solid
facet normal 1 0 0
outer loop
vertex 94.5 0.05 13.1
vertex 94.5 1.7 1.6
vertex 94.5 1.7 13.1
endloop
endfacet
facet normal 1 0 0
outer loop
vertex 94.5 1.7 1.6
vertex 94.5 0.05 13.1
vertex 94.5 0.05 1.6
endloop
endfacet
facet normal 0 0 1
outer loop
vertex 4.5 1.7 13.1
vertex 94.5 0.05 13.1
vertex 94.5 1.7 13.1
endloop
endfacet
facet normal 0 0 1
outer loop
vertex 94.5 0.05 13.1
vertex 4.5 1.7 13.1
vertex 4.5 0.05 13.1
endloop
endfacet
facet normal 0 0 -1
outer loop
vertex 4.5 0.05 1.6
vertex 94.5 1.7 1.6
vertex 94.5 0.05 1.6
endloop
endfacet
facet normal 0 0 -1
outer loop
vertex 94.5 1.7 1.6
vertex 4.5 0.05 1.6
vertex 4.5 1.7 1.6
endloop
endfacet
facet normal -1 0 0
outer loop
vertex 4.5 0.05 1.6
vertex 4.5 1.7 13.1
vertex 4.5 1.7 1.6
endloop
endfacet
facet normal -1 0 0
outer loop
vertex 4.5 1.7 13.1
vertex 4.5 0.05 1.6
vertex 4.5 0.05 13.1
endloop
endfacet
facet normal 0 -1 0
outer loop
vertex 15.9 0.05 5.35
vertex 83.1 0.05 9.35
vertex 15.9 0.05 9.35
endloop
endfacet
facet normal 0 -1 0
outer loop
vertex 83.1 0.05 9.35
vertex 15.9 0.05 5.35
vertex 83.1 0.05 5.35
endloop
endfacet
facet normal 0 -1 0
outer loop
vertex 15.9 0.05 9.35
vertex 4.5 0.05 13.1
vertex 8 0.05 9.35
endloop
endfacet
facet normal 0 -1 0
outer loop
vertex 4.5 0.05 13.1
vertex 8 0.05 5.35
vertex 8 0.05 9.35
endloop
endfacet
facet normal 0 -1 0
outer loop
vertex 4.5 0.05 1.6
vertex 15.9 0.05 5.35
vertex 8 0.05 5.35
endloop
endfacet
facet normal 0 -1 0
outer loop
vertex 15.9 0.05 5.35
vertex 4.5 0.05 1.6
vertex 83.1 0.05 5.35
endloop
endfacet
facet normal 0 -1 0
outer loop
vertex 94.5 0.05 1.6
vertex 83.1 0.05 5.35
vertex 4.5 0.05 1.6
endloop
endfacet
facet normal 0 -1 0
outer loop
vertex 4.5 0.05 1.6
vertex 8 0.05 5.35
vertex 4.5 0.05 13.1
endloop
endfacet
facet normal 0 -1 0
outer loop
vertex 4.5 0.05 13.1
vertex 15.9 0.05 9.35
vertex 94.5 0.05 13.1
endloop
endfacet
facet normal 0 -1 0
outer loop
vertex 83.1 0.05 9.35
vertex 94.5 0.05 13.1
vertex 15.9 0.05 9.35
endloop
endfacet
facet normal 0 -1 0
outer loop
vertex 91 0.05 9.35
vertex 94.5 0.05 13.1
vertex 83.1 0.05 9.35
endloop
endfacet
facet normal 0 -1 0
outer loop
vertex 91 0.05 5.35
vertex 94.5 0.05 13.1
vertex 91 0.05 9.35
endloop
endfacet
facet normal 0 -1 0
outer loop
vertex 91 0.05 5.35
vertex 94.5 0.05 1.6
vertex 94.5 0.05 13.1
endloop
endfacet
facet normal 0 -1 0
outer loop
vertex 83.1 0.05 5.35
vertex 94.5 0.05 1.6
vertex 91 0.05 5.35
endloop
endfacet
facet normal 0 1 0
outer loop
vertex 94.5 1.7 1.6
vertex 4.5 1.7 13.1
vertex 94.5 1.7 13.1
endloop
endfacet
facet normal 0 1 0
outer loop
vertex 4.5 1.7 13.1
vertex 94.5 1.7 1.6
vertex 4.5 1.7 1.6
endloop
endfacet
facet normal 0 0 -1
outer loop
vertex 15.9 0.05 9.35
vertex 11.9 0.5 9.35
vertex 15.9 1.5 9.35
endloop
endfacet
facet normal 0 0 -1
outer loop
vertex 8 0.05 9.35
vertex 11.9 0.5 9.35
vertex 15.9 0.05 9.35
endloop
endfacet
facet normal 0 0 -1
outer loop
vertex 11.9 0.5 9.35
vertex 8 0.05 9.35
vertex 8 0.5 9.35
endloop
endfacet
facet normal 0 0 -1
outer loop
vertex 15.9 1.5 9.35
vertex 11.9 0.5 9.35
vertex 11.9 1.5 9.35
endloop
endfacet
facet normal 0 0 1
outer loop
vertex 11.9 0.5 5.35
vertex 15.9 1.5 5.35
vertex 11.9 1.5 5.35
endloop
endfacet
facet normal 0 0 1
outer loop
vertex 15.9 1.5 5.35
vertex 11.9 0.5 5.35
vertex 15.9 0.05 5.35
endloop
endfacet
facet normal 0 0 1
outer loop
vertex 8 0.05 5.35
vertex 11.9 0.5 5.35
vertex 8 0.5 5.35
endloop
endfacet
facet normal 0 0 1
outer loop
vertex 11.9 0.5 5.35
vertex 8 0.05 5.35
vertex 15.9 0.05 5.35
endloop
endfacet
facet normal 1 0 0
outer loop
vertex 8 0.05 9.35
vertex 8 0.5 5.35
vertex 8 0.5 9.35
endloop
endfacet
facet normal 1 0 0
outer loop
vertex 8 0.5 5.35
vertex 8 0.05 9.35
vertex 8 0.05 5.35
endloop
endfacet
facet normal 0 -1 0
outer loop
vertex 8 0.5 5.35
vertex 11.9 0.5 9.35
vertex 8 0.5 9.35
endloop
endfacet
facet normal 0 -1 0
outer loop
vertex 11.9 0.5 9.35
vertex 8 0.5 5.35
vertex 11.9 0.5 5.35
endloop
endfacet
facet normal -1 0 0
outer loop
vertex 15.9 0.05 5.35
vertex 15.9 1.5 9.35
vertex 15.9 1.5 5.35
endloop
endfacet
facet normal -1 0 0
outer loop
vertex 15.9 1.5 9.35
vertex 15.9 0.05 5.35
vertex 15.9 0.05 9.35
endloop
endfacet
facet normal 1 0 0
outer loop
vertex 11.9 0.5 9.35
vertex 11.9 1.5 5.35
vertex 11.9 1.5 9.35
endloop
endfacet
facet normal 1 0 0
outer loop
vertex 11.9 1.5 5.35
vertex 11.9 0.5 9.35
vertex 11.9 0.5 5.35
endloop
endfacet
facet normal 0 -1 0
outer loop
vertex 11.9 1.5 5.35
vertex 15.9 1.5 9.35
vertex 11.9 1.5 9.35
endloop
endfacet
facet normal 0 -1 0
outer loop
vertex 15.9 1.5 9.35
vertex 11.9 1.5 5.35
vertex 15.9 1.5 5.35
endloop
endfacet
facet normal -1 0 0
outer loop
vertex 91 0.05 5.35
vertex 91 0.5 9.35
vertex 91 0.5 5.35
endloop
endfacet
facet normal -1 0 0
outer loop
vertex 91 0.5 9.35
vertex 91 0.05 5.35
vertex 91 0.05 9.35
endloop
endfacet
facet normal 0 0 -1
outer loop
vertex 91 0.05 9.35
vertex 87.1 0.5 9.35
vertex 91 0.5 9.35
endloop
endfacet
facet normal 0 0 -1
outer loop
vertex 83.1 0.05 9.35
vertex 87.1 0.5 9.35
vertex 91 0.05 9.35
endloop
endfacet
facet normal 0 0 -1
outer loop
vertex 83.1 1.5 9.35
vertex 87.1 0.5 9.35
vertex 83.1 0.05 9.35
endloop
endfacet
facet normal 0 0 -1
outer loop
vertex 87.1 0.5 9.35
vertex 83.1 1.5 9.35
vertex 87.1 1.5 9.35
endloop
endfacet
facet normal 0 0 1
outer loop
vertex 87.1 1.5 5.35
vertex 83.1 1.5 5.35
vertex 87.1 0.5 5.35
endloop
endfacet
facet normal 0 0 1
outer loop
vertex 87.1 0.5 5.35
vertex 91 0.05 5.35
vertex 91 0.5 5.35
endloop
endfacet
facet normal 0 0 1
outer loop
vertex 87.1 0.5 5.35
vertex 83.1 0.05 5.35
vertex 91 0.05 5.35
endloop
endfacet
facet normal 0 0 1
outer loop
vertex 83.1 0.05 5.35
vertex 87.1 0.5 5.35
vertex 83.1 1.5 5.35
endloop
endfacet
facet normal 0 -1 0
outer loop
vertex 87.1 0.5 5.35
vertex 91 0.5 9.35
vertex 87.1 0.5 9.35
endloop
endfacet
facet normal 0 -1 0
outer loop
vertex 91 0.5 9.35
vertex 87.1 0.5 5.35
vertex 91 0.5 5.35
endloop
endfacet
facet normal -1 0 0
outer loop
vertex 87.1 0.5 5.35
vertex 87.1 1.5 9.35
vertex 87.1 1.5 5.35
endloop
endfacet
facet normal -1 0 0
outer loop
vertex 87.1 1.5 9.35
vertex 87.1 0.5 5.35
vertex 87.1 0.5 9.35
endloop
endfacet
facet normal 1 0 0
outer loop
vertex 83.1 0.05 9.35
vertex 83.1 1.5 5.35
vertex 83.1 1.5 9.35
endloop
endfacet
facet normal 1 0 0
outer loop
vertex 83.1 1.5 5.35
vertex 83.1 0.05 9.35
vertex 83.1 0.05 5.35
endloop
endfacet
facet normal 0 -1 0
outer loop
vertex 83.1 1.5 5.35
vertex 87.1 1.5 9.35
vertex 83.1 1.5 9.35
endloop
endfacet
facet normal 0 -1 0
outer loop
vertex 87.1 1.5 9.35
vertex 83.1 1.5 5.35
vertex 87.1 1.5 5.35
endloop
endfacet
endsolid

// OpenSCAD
////// MixTape 3d Printed Case///////////////////////////

// thanks for adding the wall thickness, Philip!

// 

plugHeight = 10.6; // [6:10]
tapeHeight = 11.5; //
topThickness = 1.6; 

bottom_wall_thickness = 2;

usb_charger = false;
cutout_aux_ports = false;

//rotate([55,0,$t*380]) translate([-50,0,0]){
rotate([0,0,0]) translate([0,0,0]){
//PCB();
//parts();

difference(){
    
    union(){
        tapeBody();
        tapeTop();
    }
    
    // Plugs 
    translate([2.5,50,tapeHeight-plugHeight+topThickness]) cube([13,20,plugHeight+1],false); 
    translate([83.5,50,tapeHeight-plugHeight+topThickness]) cube([13,20,plugHeight+1],false);
    
    // write protectors 
    translate([10,0,0.5*tapeHeight+1.6]) cube([4,1,4],true);
    translate([13.9,0,0.5*tapeHeight+1.6]) cube([4,3,4],true);
    translate([89,0,0.5*tapeHeight+1.6]) cube([4,1,4],true);
    translate([85.1,0,0.5*tapeHeight+1.6]) cube([4,3,4],true);

    // Power signs
    //if (!usb_charger) {
    //    translate([41,0,0.5*tapeHeight+1.6]) cube([4,1.5,1],true);
    //    translate([41,0,0.5*tapeHeight+1.6]) cube([1,1.5,4],true);
    
    //    translate([58,0,0.5*tapeHeight+1.6]) cube([4,1.5,1],true); 
    //}
}
}

module FullCase(){
    tapeBody();
    tapeTop();
}


// Modules ///////////////////////////////

module PCB(){
color("DarkKhaki") 
translate ([0,0,tapeHeight+1.6]) linear_extrude(height = 1.6, center = false, convexity = 10, twist = 0) import("mixtape_case_3D_bottom.dxf", convexity=3);
color("Gold") 
translate ([0,0,tapeHeight+3.2]) linear_extrude(height = 0.2, center = false, convexity = 10, twist = 0) import("mixtape_case_3D_PCB.dxf", convexity=3);

color("DarkKhaki") 
translate ([0,0,tapeHeight+2*topThickness]) linear_extrude(height = 1.6, center = false, convexity = 10, twist = 0) import("mixtape_case_3D_PCB_TrapezBoard.dxf", convexity=3);
color("Gold") 
translate ([0,0,tapeHeight+3*topThickness]) linear_extrude(height = 0.2, center = false, convexity = 10, twist = 0) import("mixtape_case_3D_PCB_TrapezCircuit.dxf", convexity=3);
}

module tapeBody(){ 
    difference(){
        union(){
            difference(){ 
                //color("Deeppink") 
                translate ([0,0,1.6]) linear_extrude(height = tapeHeight, center = false, convexity = 10, twist = 0) import("mixtape_case_3D_bottom.dxf", convexity=3);  

                //if (!usb_charger) {
                    //translate ([0,0,0.6]) linear_extrude(height = tapeHeight+4, center = false, convexity = 10, twist = 0) import("mixtape_case_3D_MainCase.dxf", convexity=3);
                //} else {
                    //translate ([0,0,0.6]) linear_extrude(height = tapeHeight+4, center = false, convexity = 10, twist = 0) import("mixtape_case_3D_MainCase_USB.dxf", convexity=3);
                //}
      
                //Face holes
                translate([25,64,0.5*tapeHeight+topThickness]) cube([12,2,0.7*tapeHeight],true);
                if (!usb_charger) { 
                    translate([49.5,64,0.5*tapeHeight+topThickness]) cube([16,2,0.7*tapeHeight],true); 
                }
                translate([74.3,64,0.5*tapeHeight+topThickness]) cube([12,2,0.7*tapeHeight],true);

                translate([36,65,0.5*tapeHeight+topThickness]) cube([4,2,0.7*tapeHeight],true);
                translate([63,65,0.5*tapeHeight+topThickness]) cube([4,2,0.7*tapeHeight],true);

                if (usb_charger) {
                    // cutout usb port
                    translate([49.5,64,0.5*tapeHeight+topThickness+3])cube([20,14,0.7*tapeHeight+4],true);
                }


                if (cutout_aux_ports) {
                    translate([1.5,23,0.5*tapeHeight+topThickness+3]) cube([20,12,tapeHeight],true);
                    translate([90,23,0.5*tapeHeight+topThickness+3]) cube([20,12,tapeHeight],true);      
                }
            }
            translate([49.5,7.05,0.5*tapeHeight+topThickness]) cube([90,14,1*tapeHeight],true);
        } //end union
        
        
    // wall thickness
        translate([49.5,22.5+bottom_wall_thickness,0.5*tapeHeight+topThickness-1]) cube([93,45.6,1*tapeHeight+7],true);
        translate([49.5,40+bottom_wall_thickness+2.8,0.5*tapeHeight+topThickness-1]) cube([65,35,0.7*tapeHeight+7],true);
    } // end difference
    //color("DarkKhaki") 
    if (!usb_charger) {
    //translate([40,0.05,1.6]) cube([20,10,2.5],false);
    }
}

module tapeTop(){ 
 
difference(){ 
 color("Deeppink") 
     translate ([0,0,-1.5]) linear_extrude(height = 1.5, center = false, convexity = 10, twist = 0) import("mixtape_case_3D_TopTrapez.dxf", convexity=3);
     
   color("Gold") 
     translate ([0,0,-2.2]) linear_extrude(height = 3, center = false, convexity = 10, twist = 0) import("mixtape_case_3D_Holes.dxf", convexity=3);
   translate([50,53,-2.2]) cylinder(h=1.2, r=1.3, center=false, ,$fn=30);
}   
    

difference(){    
  color("Deeppink") 
     translate ([0,0,0]) linear_extrude(height = 1.6, center = false, convexity = 10, twist = 0) import("mixtape_case_3D_bottom.dxf", convexity=3);

  translate([4,3,-1]) cylinder(h=1.5, r=1.3, center=false, ,$fn=30);
  translate([95,3,-1]) cylinder(h=1.5, r=1.3, center=false, ,$fn=30);
  translate([4,61,-1]) cylinder(h=1.5, r=1.3, center=false, ,$fn=30);
  translate([95,61,-1]) cylinder(h=1.5, r=1.3, center=false, ,$fn=30);
    
  color("Pink") 
     translate ([0,0,-1.3]) linear_extrude(height = 2, center = false, convexity = 10, twist = 0) import("mixtape_case_3D_WindowRect.dxf", convexity=3); 
    
  difference(){    
  color("Gold") 
     translate ([0,0,-0.5]) linear_extrude(height = 1, center = false, convexity = 10, twist = 0) import("mixtape_case_3D_BigRect.dxf", convexity=3);  
  

  translate ([0,0,-3]) linear_extrude(height = 10, center = false, convexity = 10, twist = 0) import("mixtape_case_3D_MidRect.dxf", convexity=3);   
  }
  
  translate ([0,0,-3]) linear_extrude(height = 5.5, center = false, convexity = 10, twist = 0) import("mixtape_case_3D_Wheels.dxf", convexity=3); 
}

  translate ([0,0,0.4]) linear_extrude(height = 1.2, center = false, convexity = 10, twist = 0) import("mixtape_case_3D_NutWheels.dxf", convexity=3); 

}
 

module parts(){
    // IC-Socket
  color("Grey")
      translate([44,22.5,tapeHeight+2*topThickness]) cube([11,13,4],false);
    
  difference(){
  color("Black")
      translate([45,23.5,tapeHeight+2*topThickness]) cube([9,11,7],false);
        
    translate([49.5,34.5,tapeHeight+2*topThickness+6]) cylinder(h=10, r=1.5, center=false, ,$fn=30);
    }
    
    // NEO-Pixels
    for (a = [ 0 : 6.3 : 46 ])
    translate([a,0,0]) NEOpixel();
    
    module NEOpixel(){
    color("White")
      translate([25.2,52.5,tapeHeight+3*topThickness]) cube([5,5,2],false);
        
    color("Deeppink")
      translate([27.7,55,tapeHeight+3*topThickness]) cylinder(h=2.5, r=2, center=false, ,$fn=30);
    }
    
    // Pots
    potentiometer();
    translate ([42,0,0]) potentiometer();
    
    module potentiometer(){
    color("Grey")
      translate([29,29,tapeHeight+2*topThickness]) cylinder(h=10, r=3.5, center=false, ,$fn=30);
    
    color("Deeppink")
        translate([29,29,tapeHeight+2*topThickness+2]) cylinder(h=12, r1=6, r2=4.5, center=false, ,$fn=30);
    }
    
    // Buttons
    button();
    translate ([58,0,0]) button();
    
    module button(){
    color("Grey")
      translate([17.5,9.8,tapeHeight+2*topThickness]) cube([6,6,3],false);
        
    color("Red")
      translate([20.5,12.8,tapeHeight+2*topThickness]) cylinder(h=5, r=1.5, center=false, ,$fn=30);
    }

}
